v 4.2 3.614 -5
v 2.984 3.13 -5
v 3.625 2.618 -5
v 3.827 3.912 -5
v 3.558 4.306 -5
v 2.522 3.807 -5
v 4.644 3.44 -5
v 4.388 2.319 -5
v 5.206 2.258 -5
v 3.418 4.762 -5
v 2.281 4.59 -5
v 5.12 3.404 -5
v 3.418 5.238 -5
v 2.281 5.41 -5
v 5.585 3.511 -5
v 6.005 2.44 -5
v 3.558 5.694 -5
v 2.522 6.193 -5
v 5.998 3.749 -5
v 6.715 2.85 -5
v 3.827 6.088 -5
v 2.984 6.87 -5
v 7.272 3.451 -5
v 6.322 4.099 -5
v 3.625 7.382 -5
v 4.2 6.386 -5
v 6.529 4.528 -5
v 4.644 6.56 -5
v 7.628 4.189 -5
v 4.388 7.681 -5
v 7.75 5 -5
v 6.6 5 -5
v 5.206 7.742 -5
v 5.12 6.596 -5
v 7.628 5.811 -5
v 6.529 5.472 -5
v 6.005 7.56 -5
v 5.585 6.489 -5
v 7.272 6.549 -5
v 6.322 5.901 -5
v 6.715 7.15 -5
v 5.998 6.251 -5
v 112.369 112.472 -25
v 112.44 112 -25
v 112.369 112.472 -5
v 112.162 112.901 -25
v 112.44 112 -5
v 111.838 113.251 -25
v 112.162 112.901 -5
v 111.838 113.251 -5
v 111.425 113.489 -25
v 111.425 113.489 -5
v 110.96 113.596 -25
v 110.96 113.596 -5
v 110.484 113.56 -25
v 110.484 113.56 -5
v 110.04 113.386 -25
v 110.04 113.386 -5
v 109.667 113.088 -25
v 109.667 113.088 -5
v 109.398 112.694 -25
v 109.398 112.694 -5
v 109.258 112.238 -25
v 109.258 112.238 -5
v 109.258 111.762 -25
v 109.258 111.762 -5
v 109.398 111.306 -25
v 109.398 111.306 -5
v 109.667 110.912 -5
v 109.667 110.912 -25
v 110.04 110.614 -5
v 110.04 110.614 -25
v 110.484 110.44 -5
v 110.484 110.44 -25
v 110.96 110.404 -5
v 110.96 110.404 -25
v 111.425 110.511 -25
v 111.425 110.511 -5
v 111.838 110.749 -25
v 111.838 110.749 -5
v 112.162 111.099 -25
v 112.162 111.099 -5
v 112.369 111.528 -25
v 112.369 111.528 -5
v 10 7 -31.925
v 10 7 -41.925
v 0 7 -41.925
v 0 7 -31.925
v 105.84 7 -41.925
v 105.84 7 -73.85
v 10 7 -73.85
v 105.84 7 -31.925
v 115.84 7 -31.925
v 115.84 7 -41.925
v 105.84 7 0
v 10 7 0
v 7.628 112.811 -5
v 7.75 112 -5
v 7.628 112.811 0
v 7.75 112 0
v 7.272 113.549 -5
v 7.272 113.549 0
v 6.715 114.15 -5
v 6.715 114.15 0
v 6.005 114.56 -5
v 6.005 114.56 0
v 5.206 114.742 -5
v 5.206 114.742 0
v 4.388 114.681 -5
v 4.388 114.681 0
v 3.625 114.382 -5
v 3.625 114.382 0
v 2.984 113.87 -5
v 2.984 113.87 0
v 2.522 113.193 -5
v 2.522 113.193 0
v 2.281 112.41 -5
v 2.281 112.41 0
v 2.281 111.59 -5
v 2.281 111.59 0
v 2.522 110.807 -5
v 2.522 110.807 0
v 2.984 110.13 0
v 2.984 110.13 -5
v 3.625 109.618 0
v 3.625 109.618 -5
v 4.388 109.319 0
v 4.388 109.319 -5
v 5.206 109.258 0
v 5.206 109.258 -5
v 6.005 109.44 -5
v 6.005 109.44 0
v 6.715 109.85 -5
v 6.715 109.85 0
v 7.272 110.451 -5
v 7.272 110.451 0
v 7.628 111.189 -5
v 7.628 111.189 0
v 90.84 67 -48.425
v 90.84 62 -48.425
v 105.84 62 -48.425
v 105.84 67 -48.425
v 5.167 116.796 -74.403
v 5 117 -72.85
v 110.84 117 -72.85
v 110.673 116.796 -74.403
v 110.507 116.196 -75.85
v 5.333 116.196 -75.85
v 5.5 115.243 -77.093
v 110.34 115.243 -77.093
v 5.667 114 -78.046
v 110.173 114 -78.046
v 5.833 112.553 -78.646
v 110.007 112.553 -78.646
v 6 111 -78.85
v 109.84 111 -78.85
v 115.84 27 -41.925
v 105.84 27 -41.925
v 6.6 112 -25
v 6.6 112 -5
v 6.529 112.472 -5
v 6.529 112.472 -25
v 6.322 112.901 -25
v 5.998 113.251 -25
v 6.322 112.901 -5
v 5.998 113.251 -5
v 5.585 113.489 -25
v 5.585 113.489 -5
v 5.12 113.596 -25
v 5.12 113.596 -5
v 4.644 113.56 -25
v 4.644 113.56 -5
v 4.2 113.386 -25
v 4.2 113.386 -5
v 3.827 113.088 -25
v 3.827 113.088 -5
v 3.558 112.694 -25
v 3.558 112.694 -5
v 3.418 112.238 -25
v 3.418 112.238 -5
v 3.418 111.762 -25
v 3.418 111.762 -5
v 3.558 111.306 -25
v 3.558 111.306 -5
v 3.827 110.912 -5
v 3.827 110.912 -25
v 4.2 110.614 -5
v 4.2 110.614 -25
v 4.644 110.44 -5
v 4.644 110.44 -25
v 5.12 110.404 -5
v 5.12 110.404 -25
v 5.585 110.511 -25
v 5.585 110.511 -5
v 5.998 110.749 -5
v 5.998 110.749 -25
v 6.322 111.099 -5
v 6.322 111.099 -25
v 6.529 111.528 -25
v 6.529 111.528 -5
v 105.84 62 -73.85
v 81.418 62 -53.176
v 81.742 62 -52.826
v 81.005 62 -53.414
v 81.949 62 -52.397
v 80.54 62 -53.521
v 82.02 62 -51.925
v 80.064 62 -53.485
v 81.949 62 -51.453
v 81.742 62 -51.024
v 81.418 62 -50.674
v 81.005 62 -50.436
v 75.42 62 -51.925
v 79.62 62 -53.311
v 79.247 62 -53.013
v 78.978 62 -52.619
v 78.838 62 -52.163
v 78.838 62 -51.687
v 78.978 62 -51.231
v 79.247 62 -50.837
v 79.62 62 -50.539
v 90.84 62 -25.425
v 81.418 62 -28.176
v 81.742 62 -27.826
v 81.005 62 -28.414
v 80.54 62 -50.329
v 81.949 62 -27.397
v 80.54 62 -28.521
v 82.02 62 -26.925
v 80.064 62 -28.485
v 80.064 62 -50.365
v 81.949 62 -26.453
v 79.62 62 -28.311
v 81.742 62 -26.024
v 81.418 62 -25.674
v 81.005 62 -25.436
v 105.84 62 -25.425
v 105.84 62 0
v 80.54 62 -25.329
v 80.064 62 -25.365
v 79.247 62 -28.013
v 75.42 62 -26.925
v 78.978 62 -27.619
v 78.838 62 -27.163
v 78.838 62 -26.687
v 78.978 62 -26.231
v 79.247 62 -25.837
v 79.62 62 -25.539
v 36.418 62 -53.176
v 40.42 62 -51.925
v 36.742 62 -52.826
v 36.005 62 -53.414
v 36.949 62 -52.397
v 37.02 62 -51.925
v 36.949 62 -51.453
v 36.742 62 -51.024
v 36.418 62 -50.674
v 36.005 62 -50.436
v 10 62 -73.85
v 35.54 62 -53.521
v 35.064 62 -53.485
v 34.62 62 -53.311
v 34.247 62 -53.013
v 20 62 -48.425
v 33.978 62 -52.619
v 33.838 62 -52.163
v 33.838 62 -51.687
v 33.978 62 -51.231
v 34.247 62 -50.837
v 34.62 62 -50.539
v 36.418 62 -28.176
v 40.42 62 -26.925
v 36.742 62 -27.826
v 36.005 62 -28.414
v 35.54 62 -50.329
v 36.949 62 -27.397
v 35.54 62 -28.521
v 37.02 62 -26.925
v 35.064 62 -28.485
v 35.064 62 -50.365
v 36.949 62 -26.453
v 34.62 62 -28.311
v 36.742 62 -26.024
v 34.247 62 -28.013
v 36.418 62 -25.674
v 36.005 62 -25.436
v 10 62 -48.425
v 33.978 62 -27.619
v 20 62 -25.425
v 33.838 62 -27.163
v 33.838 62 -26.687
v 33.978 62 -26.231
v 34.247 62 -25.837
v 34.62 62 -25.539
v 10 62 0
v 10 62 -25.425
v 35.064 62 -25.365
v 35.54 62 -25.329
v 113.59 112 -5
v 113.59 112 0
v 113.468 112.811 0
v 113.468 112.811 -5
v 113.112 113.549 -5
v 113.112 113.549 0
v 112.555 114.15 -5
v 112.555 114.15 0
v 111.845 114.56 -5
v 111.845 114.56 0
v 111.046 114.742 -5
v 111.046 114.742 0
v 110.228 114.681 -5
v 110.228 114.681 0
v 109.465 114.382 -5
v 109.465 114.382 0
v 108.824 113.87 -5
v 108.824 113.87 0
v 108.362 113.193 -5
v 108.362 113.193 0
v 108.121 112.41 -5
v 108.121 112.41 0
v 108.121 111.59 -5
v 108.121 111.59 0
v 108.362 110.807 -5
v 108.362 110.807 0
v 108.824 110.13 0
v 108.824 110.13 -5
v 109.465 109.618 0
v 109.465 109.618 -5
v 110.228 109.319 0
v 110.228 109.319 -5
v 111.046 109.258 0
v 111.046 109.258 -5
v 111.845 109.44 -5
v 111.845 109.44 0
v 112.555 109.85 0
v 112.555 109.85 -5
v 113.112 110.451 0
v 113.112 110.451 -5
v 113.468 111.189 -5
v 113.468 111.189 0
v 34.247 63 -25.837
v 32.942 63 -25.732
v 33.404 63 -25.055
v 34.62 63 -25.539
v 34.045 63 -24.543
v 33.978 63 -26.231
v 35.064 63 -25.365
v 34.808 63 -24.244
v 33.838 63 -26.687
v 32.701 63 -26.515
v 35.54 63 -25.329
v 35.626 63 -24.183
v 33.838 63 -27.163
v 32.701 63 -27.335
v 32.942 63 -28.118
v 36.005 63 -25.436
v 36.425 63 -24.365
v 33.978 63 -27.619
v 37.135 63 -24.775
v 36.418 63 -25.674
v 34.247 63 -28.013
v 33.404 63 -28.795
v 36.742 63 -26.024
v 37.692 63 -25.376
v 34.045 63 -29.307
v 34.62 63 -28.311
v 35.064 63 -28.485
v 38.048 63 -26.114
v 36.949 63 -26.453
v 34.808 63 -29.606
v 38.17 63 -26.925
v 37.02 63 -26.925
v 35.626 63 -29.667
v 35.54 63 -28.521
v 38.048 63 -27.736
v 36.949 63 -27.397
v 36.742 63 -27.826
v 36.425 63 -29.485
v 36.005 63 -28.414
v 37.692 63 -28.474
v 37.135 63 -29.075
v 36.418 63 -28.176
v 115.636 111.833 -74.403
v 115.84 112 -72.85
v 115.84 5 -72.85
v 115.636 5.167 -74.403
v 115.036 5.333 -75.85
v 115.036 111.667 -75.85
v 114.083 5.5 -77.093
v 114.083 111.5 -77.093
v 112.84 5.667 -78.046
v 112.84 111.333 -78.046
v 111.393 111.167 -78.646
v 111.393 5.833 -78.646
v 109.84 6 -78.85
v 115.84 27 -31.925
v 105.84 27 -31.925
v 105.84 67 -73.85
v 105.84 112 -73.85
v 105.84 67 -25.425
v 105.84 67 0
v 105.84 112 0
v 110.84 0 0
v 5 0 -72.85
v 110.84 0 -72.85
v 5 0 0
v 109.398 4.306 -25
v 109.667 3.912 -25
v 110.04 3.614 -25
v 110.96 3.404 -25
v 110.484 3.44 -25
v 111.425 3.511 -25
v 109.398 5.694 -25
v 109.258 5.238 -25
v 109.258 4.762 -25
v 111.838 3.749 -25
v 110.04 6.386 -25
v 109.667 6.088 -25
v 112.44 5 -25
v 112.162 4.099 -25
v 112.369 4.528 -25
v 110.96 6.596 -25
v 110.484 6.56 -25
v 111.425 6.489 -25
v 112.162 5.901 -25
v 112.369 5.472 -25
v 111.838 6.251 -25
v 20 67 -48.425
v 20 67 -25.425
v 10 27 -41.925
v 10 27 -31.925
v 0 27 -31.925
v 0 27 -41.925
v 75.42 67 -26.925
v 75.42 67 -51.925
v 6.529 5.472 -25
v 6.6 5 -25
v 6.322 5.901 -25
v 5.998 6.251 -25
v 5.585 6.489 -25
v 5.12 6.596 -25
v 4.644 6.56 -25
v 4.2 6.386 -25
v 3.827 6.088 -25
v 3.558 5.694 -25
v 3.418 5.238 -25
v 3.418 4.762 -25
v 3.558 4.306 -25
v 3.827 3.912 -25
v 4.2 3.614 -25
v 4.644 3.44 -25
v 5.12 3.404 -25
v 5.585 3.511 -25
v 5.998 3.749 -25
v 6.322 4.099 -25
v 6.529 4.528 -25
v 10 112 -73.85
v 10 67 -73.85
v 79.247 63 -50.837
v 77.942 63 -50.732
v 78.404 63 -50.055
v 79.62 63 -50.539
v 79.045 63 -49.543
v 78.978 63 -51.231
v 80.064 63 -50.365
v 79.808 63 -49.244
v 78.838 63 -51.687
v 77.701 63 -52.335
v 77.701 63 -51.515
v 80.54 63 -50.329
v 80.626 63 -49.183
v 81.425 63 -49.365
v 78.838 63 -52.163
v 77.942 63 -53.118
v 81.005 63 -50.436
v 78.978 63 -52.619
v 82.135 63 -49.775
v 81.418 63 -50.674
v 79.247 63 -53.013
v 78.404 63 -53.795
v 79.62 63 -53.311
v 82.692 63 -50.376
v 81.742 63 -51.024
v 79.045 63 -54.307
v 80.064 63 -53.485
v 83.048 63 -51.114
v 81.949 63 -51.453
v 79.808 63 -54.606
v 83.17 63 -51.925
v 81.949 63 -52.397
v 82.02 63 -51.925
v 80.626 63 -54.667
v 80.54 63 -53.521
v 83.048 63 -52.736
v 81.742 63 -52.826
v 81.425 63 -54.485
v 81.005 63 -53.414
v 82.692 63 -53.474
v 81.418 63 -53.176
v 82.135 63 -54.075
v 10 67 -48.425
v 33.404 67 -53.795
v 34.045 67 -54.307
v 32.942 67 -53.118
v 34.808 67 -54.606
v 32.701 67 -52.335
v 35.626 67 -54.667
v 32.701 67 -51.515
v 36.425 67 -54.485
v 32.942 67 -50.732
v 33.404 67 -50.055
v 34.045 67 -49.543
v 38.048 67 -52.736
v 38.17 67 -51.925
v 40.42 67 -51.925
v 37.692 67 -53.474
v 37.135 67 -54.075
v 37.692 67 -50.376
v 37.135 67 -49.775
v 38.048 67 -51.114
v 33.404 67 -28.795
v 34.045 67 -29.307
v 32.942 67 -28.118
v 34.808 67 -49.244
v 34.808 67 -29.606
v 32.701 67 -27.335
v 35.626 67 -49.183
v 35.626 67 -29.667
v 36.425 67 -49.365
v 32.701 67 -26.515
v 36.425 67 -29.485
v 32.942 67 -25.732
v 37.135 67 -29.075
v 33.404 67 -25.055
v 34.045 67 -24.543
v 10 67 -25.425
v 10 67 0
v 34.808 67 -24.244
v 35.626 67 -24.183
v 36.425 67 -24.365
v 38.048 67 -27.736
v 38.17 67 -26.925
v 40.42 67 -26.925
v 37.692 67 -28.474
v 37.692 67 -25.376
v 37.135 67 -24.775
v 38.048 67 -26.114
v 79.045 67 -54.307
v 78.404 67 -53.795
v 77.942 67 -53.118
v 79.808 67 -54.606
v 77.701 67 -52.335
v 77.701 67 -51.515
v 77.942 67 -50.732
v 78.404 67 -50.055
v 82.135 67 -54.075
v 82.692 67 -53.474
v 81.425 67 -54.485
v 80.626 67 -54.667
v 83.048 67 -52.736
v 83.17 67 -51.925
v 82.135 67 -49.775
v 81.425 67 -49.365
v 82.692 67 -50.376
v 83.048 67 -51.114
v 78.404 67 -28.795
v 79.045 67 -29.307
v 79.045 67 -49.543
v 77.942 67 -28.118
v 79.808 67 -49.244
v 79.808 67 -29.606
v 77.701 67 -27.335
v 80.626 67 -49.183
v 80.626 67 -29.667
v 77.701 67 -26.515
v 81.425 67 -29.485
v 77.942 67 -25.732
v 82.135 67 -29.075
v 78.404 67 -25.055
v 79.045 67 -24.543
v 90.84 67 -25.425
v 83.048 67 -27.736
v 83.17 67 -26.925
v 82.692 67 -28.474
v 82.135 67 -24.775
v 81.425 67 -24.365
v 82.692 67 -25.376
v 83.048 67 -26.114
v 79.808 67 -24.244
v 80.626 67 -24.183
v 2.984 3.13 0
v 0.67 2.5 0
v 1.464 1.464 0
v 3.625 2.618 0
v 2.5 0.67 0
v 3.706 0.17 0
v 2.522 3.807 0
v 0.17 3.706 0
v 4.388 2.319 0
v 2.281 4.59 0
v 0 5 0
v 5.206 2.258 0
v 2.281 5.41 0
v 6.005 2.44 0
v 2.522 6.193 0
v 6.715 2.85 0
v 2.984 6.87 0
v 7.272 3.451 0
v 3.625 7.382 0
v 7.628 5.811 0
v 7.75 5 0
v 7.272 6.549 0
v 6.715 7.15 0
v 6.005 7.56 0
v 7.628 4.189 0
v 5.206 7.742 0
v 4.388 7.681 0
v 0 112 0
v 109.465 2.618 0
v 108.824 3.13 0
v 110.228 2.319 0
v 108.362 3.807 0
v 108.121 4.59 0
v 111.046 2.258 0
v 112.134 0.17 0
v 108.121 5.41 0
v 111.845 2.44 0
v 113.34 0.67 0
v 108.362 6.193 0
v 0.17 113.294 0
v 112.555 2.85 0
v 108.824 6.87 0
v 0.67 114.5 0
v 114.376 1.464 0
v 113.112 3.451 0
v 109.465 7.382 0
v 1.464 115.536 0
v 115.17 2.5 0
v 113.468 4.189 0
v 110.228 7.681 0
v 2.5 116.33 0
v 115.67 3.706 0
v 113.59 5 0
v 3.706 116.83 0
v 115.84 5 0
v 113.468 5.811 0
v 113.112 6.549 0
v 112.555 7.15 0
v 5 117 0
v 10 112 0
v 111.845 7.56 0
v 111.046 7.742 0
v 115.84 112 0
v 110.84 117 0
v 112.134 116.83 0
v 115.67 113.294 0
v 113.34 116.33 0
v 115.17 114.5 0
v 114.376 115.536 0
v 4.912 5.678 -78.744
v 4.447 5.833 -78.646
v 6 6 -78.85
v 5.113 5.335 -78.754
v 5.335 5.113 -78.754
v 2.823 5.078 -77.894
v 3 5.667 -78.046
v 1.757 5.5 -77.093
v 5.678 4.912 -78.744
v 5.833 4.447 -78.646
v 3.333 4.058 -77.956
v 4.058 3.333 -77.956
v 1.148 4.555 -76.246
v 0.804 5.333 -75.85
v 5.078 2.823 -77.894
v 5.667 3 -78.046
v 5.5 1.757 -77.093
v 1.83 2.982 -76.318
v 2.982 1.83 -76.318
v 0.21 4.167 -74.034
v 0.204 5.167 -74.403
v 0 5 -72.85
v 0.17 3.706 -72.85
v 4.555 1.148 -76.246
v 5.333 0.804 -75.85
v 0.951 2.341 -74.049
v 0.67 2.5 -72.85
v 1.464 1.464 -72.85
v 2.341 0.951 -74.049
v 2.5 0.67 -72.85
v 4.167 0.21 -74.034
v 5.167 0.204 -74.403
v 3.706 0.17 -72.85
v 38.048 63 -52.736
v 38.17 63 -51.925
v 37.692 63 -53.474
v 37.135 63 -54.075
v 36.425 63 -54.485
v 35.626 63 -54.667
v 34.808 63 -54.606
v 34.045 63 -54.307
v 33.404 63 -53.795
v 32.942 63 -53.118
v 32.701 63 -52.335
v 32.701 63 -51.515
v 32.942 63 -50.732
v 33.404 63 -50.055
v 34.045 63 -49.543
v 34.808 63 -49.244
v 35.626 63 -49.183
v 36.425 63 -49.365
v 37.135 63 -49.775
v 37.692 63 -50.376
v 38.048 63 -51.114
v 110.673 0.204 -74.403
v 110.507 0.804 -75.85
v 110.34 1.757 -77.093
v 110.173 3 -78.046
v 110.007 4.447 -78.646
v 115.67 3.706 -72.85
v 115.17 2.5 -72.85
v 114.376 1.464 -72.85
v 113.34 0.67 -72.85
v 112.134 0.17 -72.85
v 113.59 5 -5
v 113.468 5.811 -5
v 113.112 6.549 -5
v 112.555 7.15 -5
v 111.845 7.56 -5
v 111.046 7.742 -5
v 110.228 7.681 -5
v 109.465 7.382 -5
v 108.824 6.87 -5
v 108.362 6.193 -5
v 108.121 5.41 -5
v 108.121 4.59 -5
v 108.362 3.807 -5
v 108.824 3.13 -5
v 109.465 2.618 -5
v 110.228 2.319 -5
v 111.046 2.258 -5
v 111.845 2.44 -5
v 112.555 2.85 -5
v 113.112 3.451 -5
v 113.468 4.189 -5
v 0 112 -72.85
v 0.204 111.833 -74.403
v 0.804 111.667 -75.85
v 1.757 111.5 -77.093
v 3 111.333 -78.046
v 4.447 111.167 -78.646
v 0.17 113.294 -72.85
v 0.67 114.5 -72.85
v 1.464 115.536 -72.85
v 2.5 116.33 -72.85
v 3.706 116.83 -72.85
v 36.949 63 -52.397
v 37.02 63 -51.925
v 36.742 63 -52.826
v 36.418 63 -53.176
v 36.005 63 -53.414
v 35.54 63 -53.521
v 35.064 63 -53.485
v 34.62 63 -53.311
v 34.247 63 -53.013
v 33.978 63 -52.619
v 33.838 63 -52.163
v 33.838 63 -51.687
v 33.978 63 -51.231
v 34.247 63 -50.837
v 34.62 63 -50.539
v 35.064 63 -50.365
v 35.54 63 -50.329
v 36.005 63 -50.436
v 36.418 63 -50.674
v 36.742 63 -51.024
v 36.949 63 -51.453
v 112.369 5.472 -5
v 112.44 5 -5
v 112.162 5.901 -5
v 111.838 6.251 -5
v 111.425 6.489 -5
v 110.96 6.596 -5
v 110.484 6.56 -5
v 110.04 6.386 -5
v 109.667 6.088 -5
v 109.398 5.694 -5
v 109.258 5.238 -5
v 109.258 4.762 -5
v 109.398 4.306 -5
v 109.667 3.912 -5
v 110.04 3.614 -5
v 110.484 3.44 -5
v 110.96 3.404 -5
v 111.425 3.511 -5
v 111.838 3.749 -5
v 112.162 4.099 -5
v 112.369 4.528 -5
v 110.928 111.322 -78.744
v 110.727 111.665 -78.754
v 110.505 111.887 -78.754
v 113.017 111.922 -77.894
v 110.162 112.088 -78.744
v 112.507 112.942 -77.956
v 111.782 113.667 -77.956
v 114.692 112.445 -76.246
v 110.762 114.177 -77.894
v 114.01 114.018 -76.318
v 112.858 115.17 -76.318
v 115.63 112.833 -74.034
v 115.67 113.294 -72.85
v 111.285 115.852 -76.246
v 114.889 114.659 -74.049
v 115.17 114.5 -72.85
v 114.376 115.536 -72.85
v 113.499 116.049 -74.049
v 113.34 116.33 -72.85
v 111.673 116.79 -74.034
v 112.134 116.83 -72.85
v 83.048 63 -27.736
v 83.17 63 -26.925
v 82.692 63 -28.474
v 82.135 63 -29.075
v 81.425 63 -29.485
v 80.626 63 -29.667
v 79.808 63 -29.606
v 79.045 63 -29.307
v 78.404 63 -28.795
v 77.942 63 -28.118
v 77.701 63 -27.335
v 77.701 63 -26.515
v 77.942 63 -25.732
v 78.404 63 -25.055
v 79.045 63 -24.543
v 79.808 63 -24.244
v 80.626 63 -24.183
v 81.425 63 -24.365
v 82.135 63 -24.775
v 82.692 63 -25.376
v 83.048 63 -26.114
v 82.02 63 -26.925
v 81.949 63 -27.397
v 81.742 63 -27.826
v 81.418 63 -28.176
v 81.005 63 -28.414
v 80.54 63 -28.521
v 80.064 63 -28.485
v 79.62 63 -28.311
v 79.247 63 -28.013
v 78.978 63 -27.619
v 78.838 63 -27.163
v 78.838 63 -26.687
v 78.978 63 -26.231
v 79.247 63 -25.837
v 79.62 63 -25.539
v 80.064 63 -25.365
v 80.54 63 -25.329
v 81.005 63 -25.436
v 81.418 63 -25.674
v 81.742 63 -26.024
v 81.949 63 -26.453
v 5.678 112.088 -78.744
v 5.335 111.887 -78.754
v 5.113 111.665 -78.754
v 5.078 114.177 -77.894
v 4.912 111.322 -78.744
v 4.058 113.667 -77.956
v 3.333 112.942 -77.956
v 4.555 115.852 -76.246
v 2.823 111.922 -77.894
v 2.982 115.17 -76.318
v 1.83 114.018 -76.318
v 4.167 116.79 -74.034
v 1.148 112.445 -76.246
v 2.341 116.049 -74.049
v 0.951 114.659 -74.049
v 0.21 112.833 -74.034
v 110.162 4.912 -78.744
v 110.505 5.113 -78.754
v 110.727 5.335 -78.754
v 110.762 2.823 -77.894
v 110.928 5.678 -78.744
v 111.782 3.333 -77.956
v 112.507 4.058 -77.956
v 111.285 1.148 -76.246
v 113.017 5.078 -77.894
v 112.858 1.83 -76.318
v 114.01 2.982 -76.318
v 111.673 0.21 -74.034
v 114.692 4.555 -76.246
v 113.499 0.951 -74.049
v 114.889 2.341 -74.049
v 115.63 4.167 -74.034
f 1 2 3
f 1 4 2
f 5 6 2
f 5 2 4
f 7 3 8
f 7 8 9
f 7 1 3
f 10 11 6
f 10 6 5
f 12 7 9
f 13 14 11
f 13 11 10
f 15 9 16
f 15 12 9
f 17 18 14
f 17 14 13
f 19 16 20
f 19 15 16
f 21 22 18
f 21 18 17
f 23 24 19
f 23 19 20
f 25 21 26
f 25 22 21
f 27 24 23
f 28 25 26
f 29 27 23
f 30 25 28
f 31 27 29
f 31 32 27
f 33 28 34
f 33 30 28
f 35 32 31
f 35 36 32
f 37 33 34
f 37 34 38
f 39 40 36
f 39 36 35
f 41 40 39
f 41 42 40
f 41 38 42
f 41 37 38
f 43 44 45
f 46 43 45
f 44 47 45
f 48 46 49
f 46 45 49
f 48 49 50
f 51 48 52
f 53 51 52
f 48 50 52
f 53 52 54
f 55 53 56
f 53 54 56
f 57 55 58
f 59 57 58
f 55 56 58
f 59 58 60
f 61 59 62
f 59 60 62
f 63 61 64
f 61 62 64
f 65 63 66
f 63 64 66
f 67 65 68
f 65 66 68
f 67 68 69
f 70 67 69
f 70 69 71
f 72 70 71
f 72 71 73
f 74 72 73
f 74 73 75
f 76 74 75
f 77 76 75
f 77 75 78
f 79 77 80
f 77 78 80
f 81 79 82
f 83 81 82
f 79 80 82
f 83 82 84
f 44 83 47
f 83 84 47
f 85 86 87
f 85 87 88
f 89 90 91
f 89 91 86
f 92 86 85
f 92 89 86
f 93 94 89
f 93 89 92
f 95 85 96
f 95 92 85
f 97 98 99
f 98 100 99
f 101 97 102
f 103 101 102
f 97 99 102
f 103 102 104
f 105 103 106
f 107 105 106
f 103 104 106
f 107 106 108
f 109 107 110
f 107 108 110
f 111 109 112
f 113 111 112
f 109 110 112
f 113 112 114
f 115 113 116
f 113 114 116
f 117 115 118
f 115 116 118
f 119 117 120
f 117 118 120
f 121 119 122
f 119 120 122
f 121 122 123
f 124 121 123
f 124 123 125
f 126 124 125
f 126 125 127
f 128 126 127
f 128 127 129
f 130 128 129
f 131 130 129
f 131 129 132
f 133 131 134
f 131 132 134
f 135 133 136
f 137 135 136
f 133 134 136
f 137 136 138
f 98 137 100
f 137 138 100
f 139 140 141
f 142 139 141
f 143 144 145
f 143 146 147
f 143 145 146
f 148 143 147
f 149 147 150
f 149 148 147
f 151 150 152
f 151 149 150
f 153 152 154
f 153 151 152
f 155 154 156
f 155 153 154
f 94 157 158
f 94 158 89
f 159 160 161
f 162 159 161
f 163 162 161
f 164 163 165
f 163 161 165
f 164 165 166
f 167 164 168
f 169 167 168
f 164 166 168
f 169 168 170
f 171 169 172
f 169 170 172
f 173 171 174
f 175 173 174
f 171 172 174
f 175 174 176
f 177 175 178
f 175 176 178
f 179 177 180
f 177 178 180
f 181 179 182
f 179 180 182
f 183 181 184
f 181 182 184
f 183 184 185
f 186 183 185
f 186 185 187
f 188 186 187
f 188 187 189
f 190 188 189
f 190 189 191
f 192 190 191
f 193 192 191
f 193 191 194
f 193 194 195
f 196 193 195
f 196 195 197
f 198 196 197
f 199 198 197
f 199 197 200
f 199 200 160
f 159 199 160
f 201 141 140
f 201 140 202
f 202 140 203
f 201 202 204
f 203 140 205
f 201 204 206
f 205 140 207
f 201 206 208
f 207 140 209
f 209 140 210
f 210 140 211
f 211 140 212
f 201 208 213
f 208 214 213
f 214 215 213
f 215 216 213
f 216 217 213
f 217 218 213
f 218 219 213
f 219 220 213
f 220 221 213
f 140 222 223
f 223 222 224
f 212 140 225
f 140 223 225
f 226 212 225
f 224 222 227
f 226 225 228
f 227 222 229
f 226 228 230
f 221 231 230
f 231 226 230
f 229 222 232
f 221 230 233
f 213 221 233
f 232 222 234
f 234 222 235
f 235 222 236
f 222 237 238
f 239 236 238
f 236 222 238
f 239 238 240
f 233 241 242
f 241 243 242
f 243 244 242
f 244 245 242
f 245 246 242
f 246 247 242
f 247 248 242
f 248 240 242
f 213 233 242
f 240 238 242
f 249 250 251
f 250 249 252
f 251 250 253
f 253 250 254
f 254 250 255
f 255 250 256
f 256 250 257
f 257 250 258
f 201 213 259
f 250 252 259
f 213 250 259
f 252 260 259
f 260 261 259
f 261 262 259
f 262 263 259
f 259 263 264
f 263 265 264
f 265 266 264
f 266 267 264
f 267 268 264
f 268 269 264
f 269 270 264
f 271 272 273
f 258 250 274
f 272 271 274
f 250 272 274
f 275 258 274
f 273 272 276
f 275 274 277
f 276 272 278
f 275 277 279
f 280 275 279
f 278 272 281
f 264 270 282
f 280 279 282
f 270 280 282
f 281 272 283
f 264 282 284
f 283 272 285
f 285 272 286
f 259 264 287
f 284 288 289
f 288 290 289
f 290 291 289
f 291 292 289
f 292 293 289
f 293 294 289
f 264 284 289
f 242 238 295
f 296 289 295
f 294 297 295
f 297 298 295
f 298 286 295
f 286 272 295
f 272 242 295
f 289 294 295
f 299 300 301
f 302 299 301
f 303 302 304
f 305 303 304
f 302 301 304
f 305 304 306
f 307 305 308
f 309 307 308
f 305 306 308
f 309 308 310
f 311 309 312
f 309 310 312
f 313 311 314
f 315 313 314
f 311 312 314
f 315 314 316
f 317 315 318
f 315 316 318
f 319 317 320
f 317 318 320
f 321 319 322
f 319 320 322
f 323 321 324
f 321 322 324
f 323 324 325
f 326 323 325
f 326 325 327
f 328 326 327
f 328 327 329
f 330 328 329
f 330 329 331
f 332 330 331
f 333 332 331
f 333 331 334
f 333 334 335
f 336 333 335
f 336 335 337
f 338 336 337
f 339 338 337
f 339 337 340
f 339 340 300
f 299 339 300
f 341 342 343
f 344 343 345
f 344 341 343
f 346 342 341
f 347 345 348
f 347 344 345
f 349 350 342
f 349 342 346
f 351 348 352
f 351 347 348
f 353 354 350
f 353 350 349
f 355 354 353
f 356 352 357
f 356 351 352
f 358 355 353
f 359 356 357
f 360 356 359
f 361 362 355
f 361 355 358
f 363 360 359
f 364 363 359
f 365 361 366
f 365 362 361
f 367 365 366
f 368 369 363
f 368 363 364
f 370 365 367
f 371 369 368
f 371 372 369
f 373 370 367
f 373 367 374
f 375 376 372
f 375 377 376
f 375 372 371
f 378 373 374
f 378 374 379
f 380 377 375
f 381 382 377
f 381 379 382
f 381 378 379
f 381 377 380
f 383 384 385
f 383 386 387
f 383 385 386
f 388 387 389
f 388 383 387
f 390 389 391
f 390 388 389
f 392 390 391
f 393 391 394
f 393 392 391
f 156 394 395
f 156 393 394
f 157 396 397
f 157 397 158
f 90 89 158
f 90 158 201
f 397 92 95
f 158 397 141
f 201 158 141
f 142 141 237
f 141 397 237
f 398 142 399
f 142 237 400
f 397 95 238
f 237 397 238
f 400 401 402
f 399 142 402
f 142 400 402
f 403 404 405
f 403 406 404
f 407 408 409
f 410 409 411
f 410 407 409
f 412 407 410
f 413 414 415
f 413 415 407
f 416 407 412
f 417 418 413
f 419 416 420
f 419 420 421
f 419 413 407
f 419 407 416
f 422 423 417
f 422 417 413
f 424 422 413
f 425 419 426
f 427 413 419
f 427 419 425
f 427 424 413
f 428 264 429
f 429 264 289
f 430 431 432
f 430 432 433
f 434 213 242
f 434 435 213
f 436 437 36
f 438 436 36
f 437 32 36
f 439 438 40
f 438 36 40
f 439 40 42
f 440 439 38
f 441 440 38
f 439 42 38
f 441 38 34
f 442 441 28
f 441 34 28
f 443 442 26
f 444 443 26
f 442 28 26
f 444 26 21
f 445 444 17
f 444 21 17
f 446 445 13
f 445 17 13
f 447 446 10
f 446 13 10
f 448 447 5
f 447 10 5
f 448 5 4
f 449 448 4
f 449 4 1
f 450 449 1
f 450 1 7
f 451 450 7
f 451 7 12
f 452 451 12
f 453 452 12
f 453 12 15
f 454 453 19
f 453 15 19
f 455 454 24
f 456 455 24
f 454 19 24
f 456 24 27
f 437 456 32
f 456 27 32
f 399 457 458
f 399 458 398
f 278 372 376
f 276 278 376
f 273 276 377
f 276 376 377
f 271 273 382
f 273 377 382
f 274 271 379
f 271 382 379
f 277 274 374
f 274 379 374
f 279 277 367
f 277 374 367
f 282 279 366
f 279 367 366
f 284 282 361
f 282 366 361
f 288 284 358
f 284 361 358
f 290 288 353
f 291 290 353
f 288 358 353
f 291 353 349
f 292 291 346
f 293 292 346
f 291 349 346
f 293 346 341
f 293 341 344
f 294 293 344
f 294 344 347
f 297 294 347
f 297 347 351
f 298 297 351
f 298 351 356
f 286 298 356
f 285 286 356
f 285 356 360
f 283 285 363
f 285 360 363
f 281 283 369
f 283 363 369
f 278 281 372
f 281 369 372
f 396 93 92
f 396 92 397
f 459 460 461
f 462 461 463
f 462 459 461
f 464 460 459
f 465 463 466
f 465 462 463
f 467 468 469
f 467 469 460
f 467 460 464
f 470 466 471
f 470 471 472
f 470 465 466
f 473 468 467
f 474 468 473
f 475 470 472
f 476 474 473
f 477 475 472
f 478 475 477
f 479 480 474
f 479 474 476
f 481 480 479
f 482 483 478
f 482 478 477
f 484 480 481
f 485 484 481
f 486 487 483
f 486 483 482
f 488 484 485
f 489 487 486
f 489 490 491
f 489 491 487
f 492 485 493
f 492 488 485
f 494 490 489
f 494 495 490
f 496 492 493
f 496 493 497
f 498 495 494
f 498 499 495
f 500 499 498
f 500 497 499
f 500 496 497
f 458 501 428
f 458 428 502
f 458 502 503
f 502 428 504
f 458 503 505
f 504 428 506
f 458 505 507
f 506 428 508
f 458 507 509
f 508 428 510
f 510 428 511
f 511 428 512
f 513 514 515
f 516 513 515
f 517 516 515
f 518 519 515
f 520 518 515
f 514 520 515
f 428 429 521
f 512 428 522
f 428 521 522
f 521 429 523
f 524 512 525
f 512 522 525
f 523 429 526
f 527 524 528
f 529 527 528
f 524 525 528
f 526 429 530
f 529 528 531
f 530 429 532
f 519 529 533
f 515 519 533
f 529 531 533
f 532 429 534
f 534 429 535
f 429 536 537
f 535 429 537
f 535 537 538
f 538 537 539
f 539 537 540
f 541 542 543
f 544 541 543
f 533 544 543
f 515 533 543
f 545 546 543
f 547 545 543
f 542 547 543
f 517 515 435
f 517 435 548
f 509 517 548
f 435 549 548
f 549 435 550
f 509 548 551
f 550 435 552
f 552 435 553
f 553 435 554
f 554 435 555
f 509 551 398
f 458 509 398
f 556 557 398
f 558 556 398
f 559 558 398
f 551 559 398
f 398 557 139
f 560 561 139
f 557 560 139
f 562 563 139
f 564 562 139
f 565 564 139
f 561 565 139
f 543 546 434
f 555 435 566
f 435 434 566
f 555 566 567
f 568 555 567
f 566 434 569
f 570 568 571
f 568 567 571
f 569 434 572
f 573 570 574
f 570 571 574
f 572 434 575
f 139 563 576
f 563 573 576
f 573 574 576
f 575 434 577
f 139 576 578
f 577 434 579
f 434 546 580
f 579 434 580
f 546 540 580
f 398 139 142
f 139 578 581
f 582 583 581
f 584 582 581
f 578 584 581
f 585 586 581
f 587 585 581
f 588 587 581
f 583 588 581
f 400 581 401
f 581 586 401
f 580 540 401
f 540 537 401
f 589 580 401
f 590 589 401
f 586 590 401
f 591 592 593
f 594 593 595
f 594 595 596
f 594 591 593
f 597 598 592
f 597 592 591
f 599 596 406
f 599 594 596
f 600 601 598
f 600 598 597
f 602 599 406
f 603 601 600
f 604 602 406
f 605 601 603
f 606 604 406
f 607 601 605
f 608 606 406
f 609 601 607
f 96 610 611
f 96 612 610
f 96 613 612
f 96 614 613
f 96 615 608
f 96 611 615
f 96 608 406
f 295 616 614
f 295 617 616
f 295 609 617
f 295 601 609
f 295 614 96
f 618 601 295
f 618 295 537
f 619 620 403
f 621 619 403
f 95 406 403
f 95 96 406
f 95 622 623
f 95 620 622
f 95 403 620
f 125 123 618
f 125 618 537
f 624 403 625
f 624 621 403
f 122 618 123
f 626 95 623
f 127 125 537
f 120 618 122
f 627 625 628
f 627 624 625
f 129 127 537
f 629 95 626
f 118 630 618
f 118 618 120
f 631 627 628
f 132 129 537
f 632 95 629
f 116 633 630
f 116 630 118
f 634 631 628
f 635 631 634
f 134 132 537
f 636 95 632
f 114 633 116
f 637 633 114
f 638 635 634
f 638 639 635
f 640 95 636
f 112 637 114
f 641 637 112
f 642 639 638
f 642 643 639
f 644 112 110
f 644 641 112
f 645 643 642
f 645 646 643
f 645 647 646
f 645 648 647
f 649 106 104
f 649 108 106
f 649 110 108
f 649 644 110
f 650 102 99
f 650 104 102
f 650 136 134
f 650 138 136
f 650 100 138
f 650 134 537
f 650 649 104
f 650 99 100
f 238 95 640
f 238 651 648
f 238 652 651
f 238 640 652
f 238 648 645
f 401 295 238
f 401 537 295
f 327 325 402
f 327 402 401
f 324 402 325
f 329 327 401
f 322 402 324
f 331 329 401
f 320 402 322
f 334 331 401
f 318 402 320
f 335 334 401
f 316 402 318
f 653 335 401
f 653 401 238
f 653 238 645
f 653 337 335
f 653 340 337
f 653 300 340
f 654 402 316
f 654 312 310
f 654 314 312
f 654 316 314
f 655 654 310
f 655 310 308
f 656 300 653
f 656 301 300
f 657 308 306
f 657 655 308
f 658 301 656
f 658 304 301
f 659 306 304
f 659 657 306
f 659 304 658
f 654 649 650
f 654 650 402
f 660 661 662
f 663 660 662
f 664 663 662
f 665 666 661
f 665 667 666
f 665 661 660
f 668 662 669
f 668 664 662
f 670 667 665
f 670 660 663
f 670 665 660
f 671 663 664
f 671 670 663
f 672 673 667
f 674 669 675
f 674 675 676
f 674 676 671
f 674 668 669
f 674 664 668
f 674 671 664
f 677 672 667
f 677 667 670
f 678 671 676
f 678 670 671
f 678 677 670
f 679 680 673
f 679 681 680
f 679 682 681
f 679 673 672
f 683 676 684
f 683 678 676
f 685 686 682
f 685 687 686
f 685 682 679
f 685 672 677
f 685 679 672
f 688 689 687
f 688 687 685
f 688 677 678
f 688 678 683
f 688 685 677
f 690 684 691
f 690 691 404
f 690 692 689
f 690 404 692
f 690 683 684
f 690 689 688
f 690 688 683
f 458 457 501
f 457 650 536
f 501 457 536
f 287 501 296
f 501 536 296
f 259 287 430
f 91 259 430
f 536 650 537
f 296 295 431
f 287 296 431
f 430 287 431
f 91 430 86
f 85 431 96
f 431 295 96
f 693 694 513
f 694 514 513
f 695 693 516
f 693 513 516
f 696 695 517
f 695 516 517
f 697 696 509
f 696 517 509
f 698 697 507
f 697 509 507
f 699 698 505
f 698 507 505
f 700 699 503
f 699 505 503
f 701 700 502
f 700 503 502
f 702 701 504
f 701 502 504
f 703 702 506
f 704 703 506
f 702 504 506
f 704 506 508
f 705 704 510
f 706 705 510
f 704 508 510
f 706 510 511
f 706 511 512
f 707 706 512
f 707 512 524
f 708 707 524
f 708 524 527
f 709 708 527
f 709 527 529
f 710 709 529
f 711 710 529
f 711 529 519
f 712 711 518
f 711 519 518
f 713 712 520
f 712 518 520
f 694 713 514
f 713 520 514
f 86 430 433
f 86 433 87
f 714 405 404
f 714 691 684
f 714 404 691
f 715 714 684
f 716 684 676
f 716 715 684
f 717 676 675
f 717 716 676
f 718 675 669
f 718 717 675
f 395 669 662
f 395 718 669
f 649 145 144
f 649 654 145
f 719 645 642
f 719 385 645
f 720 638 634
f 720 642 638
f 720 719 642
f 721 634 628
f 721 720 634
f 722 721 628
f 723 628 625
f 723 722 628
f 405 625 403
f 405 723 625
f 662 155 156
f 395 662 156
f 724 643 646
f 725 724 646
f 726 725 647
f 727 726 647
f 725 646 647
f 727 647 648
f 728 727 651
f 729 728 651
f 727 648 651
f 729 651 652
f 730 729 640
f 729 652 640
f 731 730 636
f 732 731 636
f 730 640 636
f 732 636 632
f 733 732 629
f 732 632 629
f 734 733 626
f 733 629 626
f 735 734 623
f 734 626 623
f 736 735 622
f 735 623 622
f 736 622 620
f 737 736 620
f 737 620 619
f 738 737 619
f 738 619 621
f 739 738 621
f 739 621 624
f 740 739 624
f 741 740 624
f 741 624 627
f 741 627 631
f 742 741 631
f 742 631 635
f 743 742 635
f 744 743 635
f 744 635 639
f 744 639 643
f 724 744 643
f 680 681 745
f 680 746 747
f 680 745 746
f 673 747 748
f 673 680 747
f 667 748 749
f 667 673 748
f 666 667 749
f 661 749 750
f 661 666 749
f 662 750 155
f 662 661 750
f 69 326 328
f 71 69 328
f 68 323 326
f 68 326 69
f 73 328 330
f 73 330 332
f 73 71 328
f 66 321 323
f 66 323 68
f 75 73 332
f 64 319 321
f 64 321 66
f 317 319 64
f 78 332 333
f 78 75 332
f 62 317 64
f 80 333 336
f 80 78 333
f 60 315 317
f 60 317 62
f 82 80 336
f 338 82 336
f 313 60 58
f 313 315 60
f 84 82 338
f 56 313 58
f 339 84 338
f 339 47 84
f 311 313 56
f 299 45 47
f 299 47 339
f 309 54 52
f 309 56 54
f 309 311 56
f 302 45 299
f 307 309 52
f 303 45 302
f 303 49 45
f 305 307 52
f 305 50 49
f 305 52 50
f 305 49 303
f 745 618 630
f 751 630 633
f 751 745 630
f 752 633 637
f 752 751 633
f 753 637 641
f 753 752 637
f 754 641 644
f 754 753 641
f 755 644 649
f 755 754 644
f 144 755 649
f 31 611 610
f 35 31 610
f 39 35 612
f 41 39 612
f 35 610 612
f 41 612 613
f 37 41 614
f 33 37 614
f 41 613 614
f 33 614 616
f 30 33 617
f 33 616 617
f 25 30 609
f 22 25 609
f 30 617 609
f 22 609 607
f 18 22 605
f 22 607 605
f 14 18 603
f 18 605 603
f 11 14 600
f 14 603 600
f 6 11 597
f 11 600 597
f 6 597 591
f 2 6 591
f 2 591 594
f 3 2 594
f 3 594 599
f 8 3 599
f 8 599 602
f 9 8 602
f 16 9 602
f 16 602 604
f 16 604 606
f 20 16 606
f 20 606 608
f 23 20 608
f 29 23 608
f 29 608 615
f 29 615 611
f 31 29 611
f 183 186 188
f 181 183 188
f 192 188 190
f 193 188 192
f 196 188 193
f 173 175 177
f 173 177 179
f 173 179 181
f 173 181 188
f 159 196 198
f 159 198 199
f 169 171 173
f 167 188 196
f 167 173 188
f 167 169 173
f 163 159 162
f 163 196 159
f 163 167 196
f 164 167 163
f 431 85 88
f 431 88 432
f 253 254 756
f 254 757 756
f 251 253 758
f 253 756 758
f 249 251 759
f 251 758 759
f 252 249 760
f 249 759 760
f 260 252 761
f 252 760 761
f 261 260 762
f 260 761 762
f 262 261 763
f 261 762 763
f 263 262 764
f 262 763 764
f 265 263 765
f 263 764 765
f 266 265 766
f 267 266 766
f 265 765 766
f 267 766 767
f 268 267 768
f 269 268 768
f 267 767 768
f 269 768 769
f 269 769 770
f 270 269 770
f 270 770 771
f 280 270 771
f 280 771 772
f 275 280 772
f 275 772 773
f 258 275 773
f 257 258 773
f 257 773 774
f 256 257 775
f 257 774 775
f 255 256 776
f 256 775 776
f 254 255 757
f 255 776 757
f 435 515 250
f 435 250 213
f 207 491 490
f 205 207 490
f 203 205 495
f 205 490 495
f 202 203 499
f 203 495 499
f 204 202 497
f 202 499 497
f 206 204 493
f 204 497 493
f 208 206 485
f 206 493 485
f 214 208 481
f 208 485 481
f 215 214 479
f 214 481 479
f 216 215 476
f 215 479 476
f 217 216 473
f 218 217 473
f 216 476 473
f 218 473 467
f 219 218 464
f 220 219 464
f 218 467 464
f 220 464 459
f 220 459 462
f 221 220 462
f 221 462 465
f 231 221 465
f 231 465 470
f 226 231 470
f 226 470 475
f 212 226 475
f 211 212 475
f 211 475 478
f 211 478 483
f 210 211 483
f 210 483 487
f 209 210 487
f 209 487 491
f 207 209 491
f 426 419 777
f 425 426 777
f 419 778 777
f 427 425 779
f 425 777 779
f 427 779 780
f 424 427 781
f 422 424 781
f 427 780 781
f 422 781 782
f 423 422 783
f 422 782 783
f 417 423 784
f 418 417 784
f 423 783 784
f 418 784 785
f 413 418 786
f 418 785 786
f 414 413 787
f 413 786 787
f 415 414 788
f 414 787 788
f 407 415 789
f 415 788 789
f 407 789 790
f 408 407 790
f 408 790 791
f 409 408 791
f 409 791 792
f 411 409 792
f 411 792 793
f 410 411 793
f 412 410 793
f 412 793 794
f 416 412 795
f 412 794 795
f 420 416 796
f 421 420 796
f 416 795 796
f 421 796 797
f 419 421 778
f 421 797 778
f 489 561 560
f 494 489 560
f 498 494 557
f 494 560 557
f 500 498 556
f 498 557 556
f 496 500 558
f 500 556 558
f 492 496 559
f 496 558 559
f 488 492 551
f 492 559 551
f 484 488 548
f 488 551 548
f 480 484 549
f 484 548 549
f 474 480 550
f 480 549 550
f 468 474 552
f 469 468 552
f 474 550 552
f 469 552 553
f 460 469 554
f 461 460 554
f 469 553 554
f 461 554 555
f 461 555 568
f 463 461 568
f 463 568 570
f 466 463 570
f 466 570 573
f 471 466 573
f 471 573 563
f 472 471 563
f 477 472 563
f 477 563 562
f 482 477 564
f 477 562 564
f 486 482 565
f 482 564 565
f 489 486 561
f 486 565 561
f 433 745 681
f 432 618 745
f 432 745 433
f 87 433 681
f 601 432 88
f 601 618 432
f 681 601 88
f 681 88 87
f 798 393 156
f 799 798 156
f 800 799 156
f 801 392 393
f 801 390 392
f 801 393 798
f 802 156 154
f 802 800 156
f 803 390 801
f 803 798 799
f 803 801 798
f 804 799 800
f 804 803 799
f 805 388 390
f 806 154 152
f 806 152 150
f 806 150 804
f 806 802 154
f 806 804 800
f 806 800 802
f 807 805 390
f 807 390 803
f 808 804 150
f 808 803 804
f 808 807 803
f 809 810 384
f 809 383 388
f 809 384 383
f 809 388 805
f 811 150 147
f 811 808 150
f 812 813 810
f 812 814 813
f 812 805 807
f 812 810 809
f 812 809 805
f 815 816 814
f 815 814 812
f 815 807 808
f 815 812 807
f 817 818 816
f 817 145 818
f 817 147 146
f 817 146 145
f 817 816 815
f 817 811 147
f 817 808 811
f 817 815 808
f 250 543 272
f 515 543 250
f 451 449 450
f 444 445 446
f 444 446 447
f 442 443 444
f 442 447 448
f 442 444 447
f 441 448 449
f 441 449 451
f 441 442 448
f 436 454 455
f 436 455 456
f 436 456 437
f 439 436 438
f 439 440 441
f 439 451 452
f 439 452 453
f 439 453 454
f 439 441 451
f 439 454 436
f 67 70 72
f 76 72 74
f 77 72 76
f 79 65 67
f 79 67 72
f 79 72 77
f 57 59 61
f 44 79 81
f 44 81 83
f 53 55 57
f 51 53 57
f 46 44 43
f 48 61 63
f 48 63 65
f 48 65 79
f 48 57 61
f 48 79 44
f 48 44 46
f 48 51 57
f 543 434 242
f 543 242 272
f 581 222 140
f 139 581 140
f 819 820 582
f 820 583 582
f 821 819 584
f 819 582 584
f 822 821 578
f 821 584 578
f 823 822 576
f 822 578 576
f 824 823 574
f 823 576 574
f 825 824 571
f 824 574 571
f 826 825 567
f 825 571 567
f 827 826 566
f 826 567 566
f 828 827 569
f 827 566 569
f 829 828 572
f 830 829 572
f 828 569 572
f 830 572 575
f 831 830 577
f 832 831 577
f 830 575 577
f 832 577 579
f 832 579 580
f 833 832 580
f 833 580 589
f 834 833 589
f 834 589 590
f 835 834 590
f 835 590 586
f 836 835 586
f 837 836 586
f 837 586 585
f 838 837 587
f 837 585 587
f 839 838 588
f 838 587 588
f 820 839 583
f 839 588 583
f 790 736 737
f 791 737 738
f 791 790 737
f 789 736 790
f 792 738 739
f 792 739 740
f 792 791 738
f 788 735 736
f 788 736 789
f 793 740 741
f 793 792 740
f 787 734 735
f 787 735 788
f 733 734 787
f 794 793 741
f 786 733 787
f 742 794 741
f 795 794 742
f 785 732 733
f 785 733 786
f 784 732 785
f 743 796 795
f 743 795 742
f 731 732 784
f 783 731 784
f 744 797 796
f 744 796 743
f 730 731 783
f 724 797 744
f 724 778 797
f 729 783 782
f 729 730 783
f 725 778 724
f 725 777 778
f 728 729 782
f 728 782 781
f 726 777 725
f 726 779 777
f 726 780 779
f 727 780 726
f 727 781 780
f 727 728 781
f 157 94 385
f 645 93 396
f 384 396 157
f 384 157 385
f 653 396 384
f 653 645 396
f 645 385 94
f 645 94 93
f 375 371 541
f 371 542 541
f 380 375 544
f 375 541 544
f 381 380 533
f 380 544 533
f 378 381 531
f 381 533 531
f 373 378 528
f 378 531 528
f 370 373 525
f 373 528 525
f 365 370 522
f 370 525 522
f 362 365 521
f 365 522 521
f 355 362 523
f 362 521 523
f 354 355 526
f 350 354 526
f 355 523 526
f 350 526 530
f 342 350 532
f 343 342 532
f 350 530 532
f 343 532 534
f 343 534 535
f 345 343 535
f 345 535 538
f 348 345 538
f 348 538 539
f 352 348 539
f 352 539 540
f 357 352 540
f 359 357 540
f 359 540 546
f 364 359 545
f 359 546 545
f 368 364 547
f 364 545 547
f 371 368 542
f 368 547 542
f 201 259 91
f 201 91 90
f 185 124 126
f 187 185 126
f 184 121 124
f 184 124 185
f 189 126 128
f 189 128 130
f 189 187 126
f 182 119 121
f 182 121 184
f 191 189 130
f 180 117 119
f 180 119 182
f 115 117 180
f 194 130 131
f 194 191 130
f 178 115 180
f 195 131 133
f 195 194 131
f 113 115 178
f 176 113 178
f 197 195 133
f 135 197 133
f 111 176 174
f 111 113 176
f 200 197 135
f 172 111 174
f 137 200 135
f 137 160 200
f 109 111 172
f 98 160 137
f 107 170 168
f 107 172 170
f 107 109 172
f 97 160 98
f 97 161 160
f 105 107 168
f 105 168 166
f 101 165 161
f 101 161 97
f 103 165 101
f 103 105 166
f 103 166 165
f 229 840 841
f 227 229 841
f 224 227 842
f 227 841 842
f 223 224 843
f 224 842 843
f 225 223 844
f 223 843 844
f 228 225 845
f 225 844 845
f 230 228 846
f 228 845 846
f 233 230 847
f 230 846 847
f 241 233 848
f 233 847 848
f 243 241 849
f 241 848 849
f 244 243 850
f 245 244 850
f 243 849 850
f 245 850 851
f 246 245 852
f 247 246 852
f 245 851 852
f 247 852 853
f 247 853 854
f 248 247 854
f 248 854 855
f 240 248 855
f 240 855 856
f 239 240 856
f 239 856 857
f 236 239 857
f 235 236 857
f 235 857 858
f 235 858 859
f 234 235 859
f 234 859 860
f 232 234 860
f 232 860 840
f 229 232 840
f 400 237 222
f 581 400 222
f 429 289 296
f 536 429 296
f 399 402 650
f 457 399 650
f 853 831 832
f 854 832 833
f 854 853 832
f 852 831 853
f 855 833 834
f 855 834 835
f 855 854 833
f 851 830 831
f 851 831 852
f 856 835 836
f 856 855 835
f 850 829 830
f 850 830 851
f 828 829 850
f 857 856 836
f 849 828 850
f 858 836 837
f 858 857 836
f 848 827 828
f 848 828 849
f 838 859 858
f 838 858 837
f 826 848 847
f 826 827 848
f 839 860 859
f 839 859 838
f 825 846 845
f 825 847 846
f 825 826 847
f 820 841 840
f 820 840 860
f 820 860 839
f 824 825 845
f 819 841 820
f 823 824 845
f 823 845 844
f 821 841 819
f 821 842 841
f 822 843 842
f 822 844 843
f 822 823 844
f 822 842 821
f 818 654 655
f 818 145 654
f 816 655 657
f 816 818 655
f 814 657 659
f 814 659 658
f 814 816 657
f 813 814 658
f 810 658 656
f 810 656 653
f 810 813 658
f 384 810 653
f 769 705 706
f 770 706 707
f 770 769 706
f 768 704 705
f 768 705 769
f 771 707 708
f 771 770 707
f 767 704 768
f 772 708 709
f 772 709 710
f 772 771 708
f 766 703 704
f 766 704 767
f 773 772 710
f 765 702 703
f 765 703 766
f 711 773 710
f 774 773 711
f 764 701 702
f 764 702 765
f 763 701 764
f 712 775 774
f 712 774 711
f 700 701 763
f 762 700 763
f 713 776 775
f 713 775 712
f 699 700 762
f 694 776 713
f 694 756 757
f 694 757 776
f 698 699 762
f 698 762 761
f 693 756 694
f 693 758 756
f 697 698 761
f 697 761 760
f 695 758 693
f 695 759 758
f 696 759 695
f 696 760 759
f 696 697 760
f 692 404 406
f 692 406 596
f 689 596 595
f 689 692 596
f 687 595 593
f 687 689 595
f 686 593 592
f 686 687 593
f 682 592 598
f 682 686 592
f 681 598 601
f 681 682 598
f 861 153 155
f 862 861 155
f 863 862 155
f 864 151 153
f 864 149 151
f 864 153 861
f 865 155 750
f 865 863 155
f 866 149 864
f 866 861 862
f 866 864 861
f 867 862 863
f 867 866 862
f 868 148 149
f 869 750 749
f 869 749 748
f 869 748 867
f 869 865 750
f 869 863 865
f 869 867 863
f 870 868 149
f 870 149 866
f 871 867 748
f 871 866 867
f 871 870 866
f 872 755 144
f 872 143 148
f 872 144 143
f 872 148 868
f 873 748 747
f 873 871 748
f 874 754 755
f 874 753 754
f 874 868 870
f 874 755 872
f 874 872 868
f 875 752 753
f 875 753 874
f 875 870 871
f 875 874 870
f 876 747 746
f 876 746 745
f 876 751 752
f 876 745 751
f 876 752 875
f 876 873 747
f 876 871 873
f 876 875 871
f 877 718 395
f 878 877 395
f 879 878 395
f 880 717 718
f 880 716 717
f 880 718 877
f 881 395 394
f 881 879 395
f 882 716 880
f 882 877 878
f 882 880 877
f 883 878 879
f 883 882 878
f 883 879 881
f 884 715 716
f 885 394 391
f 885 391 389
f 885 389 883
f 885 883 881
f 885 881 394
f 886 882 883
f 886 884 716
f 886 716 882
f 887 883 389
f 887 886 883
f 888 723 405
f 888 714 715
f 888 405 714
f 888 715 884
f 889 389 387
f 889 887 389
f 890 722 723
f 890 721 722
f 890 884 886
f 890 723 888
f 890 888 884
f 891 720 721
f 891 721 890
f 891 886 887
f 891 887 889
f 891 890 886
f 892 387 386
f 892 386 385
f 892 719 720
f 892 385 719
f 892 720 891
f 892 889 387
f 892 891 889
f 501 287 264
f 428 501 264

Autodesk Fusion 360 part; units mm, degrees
sketch "Sketch1" plane through (0, 0, 0) normal (0, 0, 1) x (1, 0, 0)
  line L0 (0, 0) -> (115.84, 0)
  line L1 (115.84, 0) -> (115.84, 117)
  line L2 (115.84, 117) -> (0, 117)
  line L3 (0, 117) -> (0, 0)
  line L4 (10, 7) -> (105.84, 7)
  line L5 (105.84, 7) -> (105.84, 112)
  line L6 (105.84, 112) -> (10, 112)
  line L7 (10, 112) -> (10, 7)
  line L8 (10, 67) -> (105.84, 67)
  line L9 (105.84, 67) -> (105.84, 62)
  line L10 (105.84, 62) -> (10, 62)
  line L11 (10, 62) -> (10, 67)
  circle A0 centre (5, 112) radius 2.75
  circle A1 centre (5, 5) radius 2.75
  circle A2 centre (110.84, 5) radius 2.75
  circle A3 centre (110.84, 112) radius 2.75
  circle A4 centre (5, 112) radius 1.6
  circle A5 centre (5, 5) radius 1.6
  circle A6 centre (110.84, 5) radius 1.6
  circle A7 centre (110.84, 112) radius 1.6
  dimension "d1" = 115.84
  dimension "d2" = 117
  dimension "d3" = 95.84
  dimension "d4" = 105
  dimension "d5" = 5
  dimension "d6" = 10
  dimension "d7" = 5
  dimension "d8" = 55
  dimension "d43" = 5.5
  dimension "d44" = 5
  dimension "d45" = 5
  dimension "d46" = 5.5
  dimension "d47" = 5
  dimension "d48" = 5
  dimension "d49" = 5.5
  dimension "d50" = 5
  dimension "d51" = 5
  dimension "d52" = 5.5
  dimension "d53" = 5
  dimension "d54" = 5
  dimension "d88" = 3.2
  dimension "d89" = 3.2
  dimension "d90" = 3.2
  dimension "d91" = 3.2
extrude "Extrude1" add sketch "Sketch1" against normal blind 78.85 contours L0 L1 L2 L3 | L4 L5 L7 L10 | L5 L7 L8 L9 L10 L11 | L5 L6 L7 L8 | A0 | A1 | A2 | A3 | A4 | A5 | A6 | A7
extrude "Extrude2" cut sketch "Sketch1" against normal blind 73.85 contours L4 L5 L7 L10 | L5 L6 L7 L8
extrude "Extrude7" cut sketch "Sketch1" against normal blind 5 contours A0 | A1 | A2 | A3 | A4 | A5 | A6 | A7
extrude "Extrude11" cut sketch "Sketch1" against normal blind 25 contours A4 | A5 | A6 | A7
ref_plane "WorkPlane1" through (0, 30, 0) normal (0, 1, 0) x (0, 0, 1)
sketch "Sketch2" plane through (0, 30, 0) normal (0, 1, 0) x (1, 0, 0)
  line L0 (10, 48.425) -> (20, 48.425)
  line L1 (20, 48.425) -> (20, 25.425)
  line L2 (20, 25.425) -> (10, 25.425)
  line L3 (10, 25.425) -> (10, 48.425)
  line L4 (115.84, 0) -> (0, 0)
  line L5 (105.84, 25.425) -> (90.84, 25.425)
  line L6 (90.84, 25.425) -> (90.84, 48.425)
  line L7 (90.84, 48.425) -> (105.84, 48.425)
  line L8 (105.84, 48.425) -> (105.84, 25.425)
  line L9 (0, 0) -> (0, 78.85)
  line L10 (115.84, 0) -> (115.84, 78.85)
  dimension "d14" = 10
  dimension "d15" = 23
  dimension "d16" = 25.425
  dimension "d17" = 15
  dimension "d18" = 23
  dimension "d19" = 25.425
  dimension "d20" = 10
  dimension "d21" = 10
extrude "Extrude3" cut sketch "Sketch2" along normal blind 60
ref_plane "WorkPlane2" through (125.84, 58.5, -39.425) normal (1, 0, 0) x (0, -1, 0)
sketch "Sketch3" plane through (125.84, 0, 0) normal (1, 0, 0) x (0, 0, -1)
  line L0 (31.925, 27) -> (41.925, 27)
  line L1 (41.925, 27) -> (41.925, 7)
  line L2 (41.925, 7) -> (31.925, 7)
  line L3 (31.925, 7) -> (31.925, 27)
  line L4 (0, 0) -> (78.85, 0)
  line L5 (0, 0) -> (0, 117)
  dimension "d25" = 10
  dimension "d26" = 20
  dimension "d27" = 7
  dimension "d28" = 31.925
extrude "Extrude4" cut sketch "Sketch3" against normal blind 160
fillet "Fillet1" radius 5 4 edges at (115.84, 117, -39.425) (0, 117, -39.425) (115.84, 0, -39.425) (0, 0, -39.425)
ref_plane "WorkPlane3" through (0, 70, 0) normal (0, 1, 0) x (0, 0, 1)
sketch "Sketch4" plane through (0, 70, 0) normal (0, 1, 0) x (1, 0, 0)
  line L0 (30.42, 56.925) -> (85.42, 56.925)
  line L1 (85.42, 56.925) -> (85.42, 21.925)
  line L2 (85.42, 21.925) -> (30.42, 21.925)
  line L3 (30.42, 21.925) -> (30.42, 56.925)
  line L4 (40.42, 51.925) -> (75.42, 51.925)
  line L5 (75.42, 51.925) -> (75.42, 26.925)
  line L6 (75.42, 26.925) -> (40.42, 26.925)
  line L7 (40.42, 26.925) -> (40.42, 51.925)
  circle A0 centre (35.42, 51.925) radius 2.75
  circle A1 centre (35.42, 26.925) radius 2.75
  circle A2 centre (80.42, 51.925) radius 2.75
  circle A3 centre (80.42, 26.925) radius 2.75
  line L8 (115.84, 0) -> (0, 0)
  line L9 (115.84, 0) -> (115.84, 78.85)
  circle A4 centre (35.42, 26.925) radius 1.6
  circle A5 centre (35.42, 51.925) radius 1.6
  circle A6 centre (80.42, 51.925) radius 1.6
  circle A7 centre (80.42, 26.925) radius 1.6
  dimension "d58" = 55
  dimension "d59" = 35
  dimension "d60" = 35
  dimension "d61" = 25
  dimension "d62" = 10
  dimension "d63" = 5
  dimension "d64" = 5.5
  dimension "d65" = 5
  dimension "d66" = 5
  dimension "d67" = 5.5
  dimension "d68" = 5
  dimension "d69" = 5
  dimension "d70" = 5.5
  dimension "d71" = 5
  dimension "d72" = 5
  dimension "d73" = 5.5
  dimension "d74" = 5
  dimension "d75" = 5
  dimension "d76" = 21.925
  dimension "d77" = 30.42
  dimension "d82" = 3.2
  dimension "d83" = 3.2
  dimension "d84" = 3.2
  dimension "d85" = 3.2
extrude "Extrude8" cut sketch "Sketch4" against normal blind 15 contours L4 L5 L6 L7
extrude "Extrude9" cut sketch "Sketch4" against normal blind 7 contours A0 | A1 | A2 | A3 | A4 | A5 | A6 | A7
extrude "Extrude10" cut sketch "Sketch4" against normal blind 15 contours A4 | A5 | A6 | A7
fillet "Fillet5" radius 6 8 edges at (57.92, 0, -78.85) (114.3755, 1.4645, -78.85) (115.84, 58.5, -78.85) (114.3755, 115.5355, -78.85) (57.92, 117, -78.85) (1.4645, 115.5355, -78.85) (0, 58.5, -78.85) (1.4645, 1.4645, -78.85)
